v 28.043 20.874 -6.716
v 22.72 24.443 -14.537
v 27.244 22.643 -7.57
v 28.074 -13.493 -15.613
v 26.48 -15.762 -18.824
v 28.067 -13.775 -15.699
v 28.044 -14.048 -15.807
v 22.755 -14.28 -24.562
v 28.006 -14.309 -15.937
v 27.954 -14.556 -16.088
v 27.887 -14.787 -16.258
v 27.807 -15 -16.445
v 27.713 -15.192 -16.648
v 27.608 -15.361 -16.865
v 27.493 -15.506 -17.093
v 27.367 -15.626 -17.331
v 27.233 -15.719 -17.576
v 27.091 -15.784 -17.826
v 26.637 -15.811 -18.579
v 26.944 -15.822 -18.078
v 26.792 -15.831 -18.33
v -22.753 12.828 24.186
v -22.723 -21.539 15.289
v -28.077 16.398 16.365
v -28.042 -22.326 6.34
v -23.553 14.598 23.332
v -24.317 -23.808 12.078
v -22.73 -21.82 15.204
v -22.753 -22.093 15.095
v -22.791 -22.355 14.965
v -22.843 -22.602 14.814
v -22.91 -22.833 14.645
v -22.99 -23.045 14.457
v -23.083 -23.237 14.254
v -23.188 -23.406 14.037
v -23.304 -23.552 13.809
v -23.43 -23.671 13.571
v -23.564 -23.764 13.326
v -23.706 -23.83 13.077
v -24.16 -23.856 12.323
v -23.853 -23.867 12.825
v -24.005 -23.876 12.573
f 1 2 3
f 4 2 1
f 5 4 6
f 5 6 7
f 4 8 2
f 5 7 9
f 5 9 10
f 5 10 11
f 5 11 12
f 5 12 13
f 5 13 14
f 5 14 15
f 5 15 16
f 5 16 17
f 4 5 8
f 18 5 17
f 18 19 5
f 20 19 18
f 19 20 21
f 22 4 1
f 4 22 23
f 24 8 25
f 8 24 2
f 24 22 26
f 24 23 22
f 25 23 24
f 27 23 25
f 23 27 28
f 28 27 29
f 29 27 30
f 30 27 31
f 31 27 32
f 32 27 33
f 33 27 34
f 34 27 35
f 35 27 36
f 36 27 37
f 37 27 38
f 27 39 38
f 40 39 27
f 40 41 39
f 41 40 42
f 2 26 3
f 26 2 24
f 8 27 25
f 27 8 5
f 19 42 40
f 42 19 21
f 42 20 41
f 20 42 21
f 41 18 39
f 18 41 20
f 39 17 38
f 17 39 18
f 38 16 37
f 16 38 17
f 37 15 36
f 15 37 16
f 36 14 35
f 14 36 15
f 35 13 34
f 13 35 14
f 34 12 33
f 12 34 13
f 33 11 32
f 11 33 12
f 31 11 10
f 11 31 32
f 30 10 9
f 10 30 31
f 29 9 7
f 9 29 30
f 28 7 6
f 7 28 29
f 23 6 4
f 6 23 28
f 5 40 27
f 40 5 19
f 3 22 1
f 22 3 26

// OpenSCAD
// file: edge_round_block.scad
// R3 is a spatial convex round along X, not an XY profile corner.
$fn = 64;
body_length = 60;
body_width = 40;
body_height = 10;
edge_round_1_radius = 3;
chamfer_1_width = 1.5;

module edge_round_block(body_length=60, body_width=40, body_height=10,
                        edge_round_1_radius=3, chamfer_1_width=1.5) {
    r = edge_round_1_radius;
    w = chamfer_1_width;
    assert(min(body_length,body_width,body_height,r,w)>0);
    assert(max(r,w)<body_height && r+w<body_width);
    module along_x() {
        multmatrix([[0,0,1,-1],[1,0,0,0],[0,1,0,0],[0,0,0,1]])
            linear_extrude(height=body_length+2) children();
    }
    difference() {
        cube([body_length,body_width,body_height]);
        along_x() difference() {
            translate([0,body_height-r]) square([r,r]);
            translate([r,body_height-r]) circle(r=r);
        }
        along_x() polygon([[body_width,body_height],
            [body_width-w,body_height],[body_width,body_height-w]]);
    }
}

edge_round_block(body_length,body_width,body_height,edge_round_1_radius,chamfer_1_width);
// main file
use <edge_round_block.scad>
$fn = 16;
body_length = 60;
body_width = 40;
body_height = 10;
edge_round_1_radius = 3;
chamfer_1_width = 1.5;

rotate([17,31,9]) translate([-body_length/2,-body_width/2,-body_height/2])
    edge_round_block(body_length,body_width,body_height,edge_round_1_radius,chamfer_1_width);
